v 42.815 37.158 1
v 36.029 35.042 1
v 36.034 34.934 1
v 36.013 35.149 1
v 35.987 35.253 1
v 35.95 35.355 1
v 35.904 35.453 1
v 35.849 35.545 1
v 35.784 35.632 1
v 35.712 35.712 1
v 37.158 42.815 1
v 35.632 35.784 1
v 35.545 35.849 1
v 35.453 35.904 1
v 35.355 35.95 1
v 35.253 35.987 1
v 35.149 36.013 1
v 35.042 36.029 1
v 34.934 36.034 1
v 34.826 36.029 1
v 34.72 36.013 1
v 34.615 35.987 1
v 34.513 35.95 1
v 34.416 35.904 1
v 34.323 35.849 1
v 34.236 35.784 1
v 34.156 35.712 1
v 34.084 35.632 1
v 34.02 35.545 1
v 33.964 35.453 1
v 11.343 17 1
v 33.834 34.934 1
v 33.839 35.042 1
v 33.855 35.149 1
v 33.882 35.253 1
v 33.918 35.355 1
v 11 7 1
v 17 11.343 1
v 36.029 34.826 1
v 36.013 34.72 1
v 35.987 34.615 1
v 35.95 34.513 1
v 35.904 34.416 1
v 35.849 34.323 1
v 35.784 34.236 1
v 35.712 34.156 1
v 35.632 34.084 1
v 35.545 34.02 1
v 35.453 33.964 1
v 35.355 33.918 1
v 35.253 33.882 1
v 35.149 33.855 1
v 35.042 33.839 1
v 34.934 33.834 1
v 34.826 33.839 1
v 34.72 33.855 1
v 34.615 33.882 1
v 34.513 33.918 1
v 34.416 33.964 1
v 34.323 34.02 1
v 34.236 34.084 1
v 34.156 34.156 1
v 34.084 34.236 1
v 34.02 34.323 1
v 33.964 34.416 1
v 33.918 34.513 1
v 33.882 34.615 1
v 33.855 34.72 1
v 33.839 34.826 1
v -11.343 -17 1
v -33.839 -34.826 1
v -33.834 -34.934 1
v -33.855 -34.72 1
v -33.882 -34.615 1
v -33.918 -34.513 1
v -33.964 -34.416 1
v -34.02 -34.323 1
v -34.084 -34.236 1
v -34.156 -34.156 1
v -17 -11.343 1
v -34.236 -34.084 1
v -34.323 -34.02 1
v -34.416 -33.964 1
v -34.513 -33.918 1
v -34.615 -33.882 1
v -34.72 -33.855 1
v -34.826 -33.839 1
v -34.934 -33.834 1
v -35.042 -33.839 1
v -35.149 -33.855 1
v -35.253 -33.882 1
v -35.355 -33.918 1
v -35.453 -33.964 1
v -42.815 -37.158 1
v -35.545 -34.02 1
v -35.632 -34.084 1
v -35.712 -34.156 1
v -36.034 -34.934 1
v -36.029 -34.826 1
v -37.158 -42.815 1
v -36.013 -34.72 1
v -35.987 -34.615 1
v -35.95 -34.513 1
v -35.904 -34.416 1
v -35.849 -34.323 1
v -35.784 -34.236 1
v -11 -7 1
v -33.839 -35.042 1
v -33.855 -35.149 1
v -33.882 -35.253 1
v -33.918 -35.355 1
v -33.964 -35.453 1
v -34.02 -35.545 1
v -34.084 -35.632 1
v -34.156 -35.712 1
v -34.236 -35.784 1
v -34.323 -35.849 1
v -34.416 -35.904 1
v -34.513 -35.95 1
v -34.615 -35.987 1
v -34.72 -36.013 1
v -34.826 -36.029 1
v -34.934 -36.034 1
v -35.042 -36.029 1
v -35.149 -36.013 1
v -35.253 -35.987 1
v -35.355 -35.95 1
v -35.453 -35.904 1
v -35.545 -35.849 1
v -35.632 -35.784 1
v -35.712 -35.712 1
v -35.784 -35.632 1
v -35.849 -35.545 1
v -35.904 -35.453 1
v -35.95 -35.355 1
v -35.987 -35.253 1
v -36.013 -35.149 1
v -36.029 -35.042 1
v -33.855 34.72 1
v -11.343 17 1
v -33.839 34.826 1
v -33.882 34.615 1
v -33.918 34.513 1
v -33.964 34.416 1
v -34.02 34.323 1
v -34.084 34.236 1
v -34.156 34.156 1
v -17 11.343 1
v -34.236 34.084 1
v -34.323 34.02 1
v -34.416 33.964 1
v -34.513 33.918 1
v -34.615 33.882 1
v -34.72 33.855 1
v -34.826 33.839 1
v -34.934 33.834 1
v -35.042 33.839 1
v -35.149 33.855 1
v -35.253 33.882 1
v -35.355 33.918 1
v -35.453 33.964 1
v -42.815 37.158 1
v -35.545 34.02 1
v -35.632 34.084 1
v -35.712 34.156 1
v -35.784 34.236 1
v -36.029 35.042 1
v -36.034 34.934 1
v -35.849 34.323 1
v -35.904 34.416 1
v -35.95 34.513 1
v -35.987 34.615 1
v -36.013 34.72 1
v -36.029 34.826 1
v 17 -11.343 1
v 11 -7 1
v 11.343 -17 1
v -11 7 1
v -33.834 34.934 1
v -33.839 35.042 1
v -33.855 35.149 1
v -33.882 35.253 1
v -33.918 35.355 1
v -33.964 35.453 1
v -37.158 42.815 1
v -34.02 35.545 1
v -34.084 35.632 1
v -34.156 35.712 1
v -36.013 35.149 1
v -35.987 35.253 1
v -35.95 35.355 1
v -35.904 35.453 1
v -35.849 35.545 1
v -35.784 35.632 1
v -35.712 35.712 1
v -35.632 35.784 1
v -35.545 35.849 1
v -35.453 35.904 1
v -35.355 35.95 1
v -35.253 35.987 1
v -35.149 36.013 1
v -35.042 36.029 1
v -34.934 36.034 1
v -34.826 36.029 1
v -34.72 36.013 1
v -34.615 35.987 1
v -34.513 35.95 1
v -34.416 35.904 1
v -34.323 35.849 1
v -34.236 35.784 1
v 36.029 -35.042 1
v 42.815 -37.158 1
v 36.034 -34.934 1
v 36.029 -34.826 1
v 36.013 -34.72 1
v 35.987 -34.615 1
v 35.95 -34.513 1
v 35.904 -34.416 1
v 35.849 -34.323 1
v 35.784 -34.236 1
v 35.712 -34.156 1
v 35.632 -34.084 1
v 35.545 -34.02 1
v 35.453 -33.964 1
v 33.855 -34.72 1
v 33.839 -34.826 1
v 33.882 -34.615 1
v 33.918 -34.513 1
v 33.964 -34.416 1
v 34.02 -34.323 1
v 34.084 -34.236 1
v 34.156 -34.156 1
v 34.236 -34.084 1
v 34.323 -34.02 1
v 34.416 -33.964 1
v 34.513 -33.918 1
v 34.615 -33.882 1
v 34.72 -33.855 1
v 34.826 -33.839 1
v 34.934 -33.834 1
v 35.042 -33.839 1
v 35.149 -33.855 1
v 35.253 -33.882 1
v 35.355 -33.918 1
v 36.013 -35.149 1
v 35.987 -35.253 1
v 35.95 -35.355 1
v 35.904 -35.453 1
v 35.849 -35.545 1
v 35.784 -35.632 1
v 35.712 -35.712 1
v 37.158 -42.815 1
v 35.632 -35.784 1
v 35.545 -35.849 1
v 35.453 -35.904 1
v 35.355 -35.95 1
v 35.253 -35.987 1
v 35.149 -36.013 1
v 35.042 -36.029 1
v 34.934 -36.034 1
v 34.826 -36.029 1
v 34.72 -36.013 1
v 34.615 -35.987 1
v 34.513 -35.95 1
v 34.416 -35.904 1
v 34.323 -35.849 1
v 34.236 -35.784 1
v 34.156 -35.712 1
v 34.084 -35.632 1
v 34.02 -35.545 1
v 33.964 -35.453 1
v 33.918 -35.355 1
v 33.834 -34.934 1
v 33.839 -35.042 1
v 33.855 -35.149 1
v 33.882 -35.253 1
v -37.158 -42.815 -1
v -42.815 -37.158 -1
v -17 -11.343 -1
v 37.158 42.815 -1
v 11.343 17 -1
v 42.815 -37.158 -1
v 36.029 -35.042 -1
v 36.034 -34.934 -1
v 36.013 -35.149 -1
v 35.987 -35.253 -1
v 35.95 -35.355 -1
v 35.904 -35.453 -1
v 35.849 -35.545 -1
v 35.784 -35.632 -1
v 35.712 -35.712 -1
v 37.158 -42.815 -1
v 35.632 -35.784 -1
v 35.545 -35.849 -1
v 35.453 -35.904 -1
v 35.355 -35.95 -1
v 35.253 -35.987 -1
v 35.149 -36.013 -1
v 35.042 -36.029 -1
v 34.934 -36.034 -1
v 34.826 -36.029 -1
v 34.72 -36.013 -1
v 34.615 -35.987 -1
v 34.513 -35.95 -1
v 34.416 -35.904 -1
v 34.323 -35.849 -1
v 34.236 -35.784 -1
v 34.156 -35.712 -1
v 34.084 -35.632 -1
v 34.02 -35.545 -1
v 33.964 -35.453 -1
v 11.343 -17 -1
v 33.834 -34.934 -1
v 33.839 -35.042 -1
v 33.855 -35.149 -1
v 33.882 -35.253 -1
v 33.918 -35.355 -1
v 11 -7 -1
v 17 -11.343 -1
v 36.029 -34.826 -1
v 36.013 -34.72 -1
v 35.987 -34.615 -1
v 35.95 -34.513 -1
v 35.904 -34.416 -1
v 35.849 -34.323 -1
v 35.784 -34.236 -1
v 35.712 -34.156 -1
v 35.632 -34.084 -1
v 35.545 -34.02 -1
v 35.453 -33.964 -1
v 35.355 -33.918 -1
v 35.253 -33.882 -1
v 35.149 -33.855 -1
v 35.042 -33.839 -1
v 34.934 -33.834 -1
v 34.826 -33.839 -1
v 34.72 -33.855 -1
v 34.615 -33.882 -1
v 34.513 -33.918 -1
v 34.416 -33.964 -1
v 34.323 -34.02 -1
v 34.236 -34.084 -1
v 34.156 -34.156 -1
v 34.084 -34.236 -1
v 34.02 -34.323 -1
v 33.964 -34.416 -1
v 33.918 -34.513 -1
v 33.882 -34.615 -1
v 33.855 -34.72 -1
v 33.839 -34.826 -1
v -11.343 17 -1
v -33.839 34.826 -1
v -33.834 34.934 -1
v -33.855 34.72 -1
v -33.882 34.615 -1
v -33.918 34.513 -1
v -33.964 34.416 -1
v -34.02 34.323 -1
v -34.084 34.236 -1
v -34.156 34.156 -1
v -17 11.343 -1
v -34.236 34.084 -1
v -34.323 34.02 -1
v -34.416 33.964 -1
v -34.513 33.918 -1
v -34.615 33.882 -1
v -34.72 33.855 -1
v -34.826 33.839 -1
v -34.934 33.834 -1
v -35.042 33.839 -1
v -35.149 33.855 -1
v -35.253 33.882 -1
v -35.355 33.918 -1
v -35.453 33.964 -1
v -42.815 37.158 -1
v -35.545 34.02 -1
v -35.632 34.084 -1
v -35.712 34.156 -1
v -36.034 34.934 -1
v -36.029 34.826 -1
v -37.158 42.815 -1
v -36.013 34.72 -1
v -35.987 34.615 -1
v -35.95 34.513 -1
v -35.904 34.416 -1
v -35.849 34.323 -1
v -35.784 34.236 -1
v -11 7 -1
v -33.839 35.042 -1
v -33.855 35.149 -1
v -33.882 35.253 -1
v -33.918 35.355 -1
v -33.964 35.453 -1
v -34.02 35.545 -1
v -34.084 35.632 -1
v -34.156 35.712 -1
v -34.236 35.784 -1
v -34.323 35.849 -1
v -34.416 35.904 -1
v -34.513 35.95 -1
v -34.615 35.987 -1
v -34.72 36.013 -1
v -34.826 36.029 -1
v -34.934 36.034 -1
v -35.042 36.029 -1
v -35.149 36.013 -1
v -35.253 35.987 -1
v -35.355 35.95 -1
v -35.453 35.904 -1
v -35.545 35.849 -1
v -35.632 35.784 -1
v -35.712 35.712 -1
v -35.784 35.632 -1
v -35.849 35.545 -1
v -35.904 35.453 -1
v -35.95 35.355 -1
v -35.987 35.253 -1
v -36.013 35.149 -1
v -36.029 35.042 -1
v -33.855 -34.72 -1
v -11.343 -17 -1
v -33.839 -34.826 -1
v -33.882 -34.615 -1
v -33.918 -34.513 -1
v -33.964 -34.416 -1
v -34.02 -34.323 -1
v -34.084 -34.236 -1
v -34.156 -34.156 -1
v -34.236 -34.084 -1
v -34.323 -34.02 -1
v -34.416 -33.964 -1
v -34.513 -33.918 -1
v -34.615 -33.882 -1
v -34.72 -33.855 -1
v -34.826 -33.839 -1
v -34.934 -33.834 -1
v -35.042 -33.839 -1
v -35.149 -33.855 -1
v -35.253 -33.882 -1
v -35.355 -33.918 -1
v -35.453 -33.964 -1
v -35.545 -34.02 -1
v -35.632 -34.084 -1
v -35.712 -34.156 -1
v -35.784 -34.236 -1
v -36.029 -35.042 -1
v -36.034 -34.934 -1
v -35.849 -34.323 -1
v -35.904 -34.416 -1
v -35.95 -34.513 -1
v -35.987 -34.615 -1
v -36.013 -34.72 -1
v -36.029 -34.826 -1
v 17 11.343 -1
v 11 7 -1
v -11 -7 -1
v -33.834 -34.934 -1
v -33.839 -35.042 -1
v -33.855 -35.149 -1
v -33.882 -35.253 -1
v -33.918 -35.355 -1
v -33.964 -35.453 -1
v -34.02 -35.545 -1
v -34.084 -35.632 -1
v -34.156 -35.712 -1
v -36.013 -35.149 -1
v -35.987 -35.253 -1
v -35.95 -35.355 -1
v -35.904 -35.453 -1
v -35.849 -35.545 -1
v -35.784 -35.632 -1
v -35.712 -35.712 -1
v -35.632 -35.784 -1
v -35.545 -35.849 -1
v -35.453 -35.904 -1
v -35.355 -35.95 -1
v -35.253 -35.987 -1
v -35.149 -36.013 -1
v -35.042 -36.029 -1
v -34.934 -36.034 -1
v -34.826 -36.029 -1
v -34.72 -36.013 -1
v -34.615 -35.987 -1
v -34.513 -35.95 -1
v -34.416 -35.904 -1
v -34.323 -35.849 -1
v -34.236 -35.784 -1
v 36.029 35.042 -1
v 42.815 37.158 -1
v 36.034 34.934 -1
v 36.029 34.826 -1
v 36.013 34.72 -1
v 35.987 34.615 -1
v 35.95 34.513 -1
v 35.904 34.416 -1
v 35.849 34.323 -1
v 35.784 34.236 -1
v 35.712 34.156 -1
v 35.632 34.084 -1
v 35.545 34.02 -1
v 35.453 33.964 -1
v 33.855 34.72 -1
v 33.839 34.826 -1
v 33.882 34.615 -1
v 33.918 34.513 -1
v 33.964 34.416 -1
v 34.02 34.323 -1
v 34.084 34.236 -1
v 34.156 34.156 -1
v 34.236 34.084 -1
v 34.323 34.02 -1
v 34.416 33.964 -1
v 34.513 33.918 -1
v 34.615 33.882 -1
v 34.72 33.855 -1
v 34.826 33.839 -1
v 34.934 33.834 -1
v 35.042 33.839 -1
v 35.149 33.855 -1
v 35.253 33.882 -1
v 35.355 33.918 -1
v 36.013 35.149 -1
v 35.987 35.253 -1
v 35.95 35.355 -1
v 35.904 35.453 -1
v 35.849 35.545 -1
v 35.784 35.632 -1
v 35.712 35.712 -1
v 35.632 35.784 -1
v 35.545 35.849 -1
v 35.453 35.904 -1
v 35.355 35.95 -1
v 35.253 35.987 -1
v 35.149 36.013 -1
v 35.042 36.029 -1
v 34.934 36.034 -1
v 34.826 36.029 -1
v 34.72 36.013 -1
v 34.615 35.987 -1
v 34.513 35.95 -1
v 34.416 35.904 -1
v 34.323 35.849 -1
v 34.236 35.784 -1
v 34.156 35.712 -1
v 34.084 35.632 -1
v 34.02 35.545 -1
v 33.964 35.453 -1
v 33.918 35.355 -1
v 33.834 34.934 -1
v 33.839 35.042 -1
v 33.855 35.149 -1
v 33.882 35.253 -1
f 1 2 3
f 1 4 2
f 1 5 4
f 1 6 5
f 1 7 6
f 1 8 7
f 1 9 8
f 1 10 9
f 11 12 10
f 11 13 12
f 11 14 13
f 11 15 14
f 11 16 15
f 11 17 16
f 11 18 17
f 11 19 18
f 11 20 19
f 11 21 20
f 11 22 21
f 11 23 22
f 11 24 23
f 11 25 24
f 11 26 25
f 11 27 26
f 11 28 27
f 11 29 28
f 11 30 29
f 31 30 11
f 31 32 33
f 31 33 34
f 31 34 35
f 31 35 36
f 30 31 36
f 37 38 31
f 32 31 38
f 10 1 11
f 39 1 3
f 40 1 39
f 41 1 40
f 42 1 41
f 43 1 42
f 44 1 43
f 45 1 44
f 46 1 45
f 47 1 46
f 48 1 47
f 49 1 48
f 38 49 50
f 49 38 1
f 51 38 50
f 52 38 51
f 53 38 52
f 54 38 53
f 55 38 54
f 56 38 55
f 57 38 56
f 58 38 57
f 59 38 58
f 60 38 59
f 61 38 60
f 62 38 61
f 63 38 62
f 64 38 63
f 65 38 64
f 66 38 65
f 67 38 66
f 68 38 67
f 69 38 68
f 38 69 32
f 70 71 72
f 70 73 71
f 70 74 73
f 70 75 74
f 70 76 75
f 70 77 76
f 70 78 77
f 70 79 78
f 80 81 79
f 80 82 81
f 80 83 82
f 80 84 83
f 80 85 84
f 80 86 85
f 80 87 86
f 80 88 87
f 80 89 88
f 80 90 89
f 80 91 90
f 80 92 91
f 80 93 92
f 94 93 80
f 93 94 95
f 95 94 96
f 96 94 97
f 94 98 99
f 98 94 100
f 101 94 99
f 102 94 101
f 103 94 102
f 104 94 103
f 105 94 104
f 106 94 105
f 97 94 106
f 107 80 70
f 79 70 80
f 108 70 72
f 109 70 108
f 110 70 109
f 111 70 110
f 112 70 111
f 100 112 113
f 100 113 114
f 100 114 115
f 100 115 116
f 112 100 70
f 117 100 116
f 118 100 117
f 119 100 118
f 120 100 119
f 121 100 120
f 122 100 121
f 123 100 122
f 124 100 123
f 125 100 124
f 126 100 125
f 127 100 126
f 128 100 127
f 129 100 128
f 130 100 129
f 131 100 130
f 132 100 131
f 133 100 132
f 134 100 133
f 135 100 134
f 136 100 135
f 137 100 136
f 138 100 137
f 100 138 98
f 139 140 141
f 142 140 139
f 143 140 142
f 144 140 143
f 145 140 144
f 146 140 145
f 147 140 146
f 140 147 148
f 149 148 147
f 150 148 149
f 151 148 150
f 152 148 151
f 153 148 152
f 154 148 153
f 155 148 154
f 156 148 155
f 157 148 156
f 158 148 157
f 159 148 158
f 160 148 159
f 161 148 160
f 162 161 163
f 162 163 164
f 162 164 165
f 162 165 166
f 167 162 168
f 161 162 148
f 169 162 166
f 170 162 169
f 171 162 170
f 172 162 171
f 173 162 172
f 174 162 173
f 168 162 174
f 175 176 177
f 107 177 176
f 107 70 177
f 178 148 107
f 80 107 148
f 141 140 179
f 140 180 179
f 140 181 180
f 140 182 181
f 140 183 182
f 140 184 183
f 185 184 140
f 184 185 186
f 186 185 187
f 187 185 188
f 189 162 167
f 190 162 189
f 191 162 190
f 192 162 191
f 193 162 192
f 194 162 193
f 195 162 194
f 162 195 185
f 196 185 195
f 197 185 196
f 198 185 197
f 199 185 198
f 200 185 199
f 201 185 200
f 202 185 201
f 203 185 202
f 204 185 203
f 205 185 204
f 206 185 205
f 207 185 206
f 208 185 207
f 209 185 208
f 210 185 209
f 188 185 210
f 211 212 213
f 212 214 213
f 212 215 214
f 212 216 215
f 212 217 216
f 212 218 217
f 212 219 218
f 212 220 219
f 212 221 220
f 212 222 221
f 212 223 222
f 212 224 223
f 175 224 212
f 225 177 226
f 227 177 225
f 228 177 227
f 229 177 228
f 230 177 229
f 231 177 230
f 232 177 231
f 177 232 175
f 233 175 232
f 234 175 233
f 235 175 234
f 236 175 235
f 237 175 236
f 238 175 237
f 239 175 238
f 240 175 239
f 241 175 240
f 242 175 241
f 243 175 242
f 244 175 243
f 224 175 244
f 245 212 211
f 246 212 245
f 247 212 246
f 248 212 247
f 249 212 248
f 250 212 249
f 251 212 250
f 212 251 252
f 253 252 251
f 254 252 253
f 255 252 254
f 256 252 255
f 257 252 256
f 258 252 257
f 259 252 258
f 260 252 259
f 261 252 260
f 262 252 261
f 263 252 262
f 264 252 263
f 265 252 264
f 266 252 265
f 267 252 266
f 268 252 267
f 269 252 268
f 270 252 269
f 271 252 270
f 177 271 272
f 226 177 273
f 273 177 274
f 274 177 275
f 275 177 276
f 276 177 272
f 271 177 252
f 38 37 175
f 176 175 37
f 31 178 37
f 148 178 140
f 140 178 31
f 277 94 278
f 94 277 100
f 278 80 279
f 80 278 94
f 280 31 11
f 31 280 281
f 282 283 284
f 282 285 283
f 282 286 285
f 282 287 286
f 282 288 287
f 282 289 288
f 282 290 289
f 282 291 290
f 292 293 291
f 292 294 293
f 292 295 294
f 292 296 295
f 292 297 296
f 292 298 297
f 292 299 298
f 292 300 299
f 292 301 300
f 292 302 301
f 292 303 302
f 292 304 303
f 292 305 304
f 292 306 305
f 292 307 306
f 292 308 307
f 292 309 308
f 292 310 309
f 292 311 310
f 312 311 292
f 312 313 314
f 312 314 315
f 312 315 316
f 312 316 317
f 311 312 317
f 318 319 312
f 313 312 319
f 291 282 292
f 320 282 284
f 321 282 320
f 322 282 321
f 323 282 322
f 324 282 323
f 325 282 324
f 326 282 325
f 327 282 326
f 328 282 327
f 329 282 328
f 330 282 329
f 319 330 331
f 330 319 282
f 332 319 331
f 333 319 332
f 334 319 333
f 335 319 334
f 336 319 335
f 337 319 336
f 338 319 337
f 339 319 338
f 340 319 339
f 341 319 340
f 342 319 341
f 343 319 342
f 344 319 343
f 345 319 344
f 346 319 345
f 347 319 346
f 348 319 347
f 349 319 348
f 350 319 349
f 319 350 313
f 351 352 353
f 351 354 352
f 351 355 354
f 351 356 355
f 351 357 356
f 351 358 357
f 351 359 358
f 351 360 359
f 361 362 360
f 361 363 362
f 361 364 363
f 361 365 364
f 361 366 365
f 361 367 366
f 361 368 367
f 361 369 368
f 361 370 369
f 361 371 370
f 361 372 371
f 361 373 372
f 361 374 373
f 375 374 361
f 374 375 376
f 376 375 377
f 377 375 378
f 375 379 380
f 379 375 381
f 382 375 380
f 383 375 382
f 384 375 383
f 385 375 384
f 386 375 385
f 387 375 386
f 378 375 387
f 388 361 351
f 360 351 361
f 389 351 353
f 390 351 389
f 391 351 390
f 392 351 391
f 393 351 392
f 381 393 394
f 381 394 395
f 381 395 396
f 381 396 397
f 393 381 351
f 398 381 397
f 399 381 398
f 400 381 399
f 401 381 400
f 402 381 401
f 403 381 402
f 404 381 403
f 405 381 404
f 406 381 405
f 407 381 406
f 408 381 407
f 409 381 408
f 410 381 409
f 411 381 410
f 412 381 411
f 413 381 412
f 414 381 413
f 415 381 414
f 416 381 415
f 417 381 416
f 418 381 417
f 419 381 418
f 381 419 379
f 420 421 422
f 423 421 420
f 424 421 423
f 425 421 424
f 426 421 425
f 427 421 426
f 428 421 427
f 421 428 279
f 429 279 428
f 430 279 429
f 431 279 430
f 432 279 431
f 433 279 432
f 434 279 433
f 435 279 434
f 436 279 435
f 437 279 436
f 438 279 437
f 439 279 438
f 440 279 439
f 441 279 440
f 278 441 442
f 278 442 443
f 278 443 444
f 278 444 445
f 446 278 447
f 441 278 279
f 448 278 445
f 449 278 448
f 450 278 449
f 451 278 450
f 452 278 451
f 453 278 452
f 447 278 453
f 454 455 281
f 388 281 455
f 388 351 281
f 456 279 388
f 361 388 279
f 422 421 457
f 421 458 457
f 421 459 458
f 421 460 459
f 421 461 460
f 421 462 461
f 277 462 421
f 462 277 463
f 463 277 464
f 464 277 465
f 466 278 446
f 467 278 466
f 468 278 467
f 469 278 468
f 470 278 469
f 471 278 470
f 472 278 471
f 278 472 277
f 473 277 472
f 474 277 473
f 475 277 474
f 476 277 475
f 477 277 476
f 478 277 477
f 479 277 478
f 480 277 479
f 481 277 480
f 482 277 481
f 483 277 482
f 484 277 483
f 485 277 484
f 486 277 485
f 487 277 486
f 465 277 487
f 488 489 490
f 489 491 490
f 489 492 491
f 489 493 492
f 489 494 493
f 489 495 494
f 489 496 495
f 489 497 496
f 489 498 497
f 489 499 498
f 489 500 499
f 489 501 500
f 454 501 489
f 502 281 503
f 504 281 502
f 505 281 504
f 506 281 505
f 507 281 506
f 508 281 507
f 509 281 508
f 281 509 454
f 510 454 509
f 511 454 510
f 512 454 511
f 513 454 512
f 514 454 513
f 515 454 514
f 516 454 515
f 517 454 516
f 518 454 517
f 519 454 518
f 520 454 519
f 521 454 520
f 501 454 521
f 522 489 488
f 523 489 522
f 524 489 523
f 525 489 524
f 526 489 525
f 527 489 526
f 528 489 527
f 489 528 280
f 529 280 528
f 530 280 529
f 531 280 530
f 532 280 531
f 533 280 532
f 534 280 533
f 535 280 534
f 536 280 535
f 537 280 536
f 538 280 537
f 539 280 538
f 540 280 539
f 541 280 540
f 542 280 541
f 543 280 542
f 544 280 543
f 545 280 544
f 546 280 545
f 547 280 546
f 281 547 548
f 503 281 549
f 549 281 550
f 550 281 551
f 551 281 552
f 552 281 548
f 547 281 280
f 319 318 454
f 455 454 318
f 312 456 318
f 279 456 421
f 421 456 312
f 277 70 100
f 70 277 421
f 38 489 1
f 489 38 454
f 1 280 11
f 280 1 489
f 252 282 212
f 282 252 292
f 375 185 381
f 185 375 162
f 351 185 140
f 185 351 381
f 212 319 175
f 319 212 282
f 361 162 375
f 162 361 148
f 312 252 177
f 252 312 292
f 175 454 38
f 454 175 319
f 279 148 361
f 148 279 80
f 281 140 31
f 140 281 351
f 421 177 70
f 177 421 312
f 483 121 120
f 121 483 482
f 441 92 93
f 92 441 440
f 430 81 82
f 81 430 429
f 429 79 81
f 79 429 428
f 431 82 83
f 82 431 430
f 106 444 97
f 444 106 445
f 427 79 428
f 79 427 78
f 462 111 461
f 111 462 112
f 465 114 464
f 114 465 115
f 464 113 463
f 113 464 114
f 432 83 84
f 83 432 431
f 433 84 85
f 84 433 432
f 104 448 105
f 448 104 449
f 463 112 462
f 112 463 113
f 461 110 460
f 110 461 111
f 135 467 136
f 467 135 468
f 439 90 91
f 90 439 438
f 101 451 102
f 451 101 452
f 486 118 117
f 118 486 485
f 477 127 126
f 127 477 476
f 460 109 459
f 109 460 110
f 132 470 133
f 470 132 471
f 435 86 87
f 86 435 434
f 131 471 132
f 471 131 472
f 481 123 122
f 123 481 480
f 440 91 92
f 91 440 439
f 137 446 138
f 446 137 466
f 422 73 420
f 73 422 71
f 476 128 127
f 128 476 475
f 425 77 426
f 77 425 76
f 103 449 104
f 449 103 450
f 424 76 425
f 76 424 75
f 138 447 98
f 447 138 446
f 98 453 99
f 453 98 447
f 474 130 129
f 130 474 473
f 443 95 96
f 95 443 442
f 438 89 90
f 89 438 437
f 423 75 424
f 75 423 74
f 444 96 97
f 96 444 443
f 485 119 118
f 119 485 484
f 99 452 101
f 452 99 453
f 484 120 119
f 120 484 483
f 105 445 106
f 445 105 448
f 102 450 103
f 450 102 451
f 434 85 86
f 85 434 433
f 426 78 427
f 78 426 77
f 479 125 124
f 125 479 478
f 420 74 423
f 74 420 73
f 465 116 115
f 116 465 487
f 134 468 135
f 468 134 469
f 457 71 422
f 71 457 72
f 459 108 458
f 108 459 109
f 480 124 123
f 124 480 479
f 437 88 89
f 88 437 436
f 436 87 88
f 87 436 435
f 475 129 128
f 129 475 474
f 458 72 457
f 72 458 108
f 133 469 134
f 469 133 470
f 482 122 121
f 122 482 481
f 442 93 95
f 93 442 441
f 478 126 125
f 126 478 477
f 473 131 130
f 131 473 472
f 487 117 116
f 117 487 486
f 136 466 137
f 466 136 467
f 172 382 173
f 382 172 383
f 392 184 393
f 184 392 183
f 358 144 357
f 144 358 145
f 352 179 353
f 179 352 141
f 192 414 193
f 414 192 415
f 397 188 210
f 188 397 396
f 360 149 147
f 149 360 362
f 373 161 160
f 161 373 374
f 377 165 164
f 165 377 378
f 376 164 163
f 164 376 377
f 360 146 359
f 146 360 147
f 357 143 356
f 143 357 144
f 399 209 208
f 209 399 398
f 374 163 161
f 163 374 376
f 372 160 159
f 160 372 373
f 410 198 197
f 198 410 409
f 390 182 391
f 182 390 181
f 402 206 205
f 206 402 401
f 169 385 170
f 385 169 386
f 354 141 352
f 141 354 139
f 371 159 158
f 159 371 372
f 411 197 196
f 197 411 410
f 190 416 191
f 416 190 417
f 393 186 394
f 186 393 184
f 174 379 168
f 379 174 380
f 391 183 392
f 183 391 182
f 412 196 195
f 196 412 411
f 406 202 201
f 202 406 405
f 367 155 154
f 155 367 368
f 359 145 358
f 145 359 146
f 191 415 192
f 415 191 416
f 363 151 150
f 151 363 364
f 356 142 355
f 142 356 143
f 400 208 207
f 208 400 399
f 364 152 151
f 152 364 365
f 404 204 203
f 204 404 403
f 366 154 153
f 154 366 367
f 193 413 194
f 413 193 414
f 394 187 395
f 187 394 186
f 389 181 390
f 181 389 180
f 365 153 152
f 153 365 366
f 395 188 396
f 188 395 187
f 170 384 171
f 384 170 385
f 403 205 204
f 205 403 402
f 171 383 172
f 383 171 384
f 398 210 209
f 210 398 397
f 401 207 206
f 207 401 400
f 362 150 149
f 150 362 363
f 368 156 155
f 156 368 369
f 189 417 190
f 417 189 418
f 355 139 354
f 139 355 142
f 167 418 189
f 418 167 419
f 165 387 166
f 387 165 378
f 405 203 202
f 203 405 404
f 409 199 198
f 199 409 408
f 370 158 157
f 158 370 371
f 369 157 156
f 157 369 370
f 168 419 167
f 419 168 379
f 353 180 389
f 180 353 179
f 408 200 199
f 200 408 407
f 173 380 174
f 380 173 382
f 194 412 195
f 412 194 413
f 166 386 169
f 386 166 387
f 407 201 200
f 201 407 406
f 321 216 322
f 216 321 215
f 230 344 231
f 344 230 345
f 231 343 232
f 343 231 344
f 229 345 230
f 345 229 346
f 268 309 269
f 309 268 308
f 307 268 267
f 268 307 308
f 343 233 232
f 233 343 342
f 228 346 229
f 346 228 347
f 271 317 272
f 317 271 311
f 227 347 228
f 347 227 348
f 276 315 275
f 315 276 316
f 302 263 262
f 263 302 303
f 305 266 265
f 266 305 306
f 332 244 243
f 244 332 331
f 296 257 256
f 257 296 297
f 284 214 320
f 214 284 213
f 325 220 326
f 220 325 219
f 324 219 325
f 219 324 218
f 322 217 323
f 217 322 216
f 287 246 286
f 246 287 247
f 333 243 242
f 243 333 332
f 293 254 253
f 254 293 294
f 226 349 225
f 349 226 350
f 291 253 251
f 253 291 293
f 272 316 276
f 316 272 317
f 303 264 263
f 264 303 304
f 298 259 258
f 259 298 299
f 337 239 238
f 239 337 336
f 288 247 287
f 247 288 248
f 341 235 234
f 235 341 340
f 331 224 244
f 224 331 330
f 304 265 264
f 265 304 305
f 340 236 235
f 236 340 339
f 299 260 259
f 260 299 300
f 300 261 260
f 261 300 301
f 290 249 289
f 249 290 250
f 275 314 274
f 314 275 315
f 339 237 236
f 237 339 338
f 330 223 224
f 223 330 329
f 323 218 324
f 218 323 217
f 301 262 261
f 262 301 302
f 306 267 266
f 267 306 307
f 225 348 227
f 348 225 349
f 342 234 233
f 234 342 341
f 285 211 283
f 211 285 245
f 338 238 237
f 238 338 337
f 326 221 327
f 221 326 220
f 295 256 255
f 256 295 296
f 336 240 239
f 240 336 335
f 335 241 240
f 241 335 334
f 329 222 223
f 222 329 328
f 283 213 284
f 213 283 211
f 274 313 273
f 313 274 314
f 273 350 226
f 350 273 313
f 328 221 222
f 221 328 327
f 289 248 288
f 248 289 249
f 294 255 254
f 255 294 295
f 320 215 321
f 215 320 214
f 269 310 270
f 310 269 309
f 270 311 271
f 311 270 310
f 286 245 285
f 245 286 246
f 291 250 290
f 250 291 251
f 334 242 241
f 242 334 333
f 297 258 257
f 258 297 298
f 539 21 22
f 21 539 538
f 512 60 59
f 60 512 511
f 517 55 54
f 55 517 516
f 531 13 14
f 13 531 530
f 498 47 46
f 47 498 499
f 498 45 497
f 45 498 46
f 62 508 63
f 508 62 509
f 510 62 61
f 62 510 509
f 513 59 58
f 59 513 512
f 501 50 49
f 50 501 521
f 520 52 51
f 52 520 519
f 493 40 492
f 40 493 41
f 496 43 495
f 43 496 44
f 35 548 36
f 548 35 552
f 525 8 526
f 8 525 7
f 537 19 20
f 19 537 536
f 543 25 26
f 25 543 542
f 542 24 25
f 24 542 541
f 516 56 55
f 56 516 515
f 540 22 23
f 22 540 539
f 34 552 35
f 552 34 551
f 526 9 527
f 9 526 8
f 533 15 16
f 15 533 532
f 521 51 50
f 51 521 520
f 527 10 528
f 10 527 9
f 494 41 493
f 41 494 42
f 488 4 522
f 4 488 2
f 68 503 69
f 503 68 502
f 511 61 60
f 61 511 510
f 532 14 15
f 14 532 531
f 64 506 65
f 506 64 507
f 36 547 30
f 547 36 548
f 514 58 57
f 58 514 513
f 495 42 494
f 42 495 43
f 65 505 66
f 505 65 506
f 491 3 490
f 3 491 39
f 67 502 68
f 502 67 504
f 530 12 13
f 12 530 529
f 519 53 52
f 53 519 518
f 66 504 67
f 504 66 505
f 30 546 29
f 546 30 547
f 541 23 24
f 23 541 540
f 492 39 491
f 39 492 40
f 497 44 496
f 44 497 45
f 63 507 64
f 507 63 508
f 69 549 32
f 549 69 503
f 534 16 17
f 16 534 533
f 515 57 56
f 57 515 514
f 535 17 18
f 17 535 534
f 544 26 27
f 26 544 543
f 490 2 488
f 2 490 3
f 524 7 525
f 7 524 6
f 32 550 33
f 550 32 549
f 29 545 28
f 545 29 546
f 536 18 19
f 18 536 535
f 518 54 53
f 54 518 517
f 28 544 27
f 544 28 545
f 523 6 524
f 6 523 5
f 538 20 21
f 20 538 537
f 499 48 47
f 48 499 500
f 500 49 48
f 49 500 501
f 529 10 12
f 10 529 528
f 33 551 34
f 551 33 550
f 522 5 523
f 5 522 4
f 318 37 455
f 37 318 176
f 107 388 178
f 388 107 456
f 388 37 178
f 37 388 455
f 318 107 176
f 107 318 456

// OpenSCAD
// ============================================================
//  ORNITHOPTER — Drone estilo Dune (thopter)
//  Modelo CAD paramétrico (OpenSCAD) — chassi + carenagem
//  Abre em OpenSCAD (gratuito) e exporta STL para impressão 3D
// ============================================================

/* [Dimensões principais — mm] */
motor_spacing = 78;      // distância motor-a-motor (diagonal X)
arm_width     = 8;       // largura do braço
plate_t       = 2.0;     // espessura das placas (PLA)
motor_d       = 8.5;     // diâmetro do motor 8520
motor_h       = 20;      // altura do motor 8520
prop_d        = 65;      // hélice 65 mm
ring_w        = 3.2;     // espessura do anel de proteção (gondola)
canopy_h      = 14;      // altura da carenagem estilo thopter
hole_m2       = 2.2;     // furo M2 para motores

$fn = 64;

// ---------- Módulos ----------

// Braço do frame X (entre dois motores opostos)
module arm(len) {
    rotate([0,0,45])
        cube([len, arm_width, plate_t], center=true);
}

// Suporte do motor: anel + furos M2
module motor_mount() {
    difference() {
        cylinder(d = motor_d + 5, h = plate_t, center = true);
        cylinder(d = motor_d - 1.2, h = plate_t + 1, center = true); // cavity motor
        for (a = [0, 90, 180, 270])
            rotate([0, 0, a + 45])
                translate([(motor_d + 3) / 2, 0, 0])
                    cylinder(d = hole_m2, h = plate_t + 2, center = true);
    }
}

// Anel de proteção da hélice (gondola estilo Dune)
module prop_ring() {
    rotate_extrude()
        translate([prop_d/2 + 4, 0, 0])
            circle(d = ring_w);
}

// Corpo central: duas placas + espaçadores
module body() {
    half = motor_spacing / 2;
    // braços em X
    arm(motor_spacing * 1.45);
    mirror([0,1,0]) arm(motor_spacing * 1.45);
    // placa inferior
    translate([0, 0, -plate_t/2 - 6])
        cube([34, 34, plate_t], center = true);
    // placa superior
    translate([0, 0, plate_t/2 + 6])
        cube([34, 34, plate_t], center = true);
}

// Carenagem estilo "thopter": casco alongado com quilha
module canopy() {
    hull() {
        translate([0, 0, 8]) scale([1.6, 1, 0.55]) sphere(d = 22);
        translate([-26, 0, 4]) scale([1.2, 0.8, 0.4]) sphere(d = 16); // nariz
        translate([20, 0, 4]) scale([1.3, 0.85, 0.45]) sphere(d = 18); // cauda
    }
    // quilha ventral (estabilidade visual e antitombo)
    translate([0, 0, -1]) rotate([90, 0, 0])
        linear_extrude(height = 2, center = true)
            polygon([[-24,0],[24,0],[10,-9],[-14,-9]]);
}

// ---------- Montagem ----------

half = motor_spacing / 2;

module ornithopter() {
    body();
    // motores + anéis nos 4 cantos
    for (sx = [-1, 1], sy = [-1, 1])
        translate([sx * half, sy * half, 0]) {
            prop_ring();
            translate([0, 0, motor_h/2 + plate_t/2])
                %cylinder(d = motor_d, h = motor_h, center = true); // motor (fantasma)
        }
    canopy();
}

// Plana: Vista de topo da placa única do frame (para imprimir)
module frame_flat() {
    difference() {
        union() {
            arm(motor_spacing * 1.45);
            mirror([0,1,0]) arm(motor_spacing * 1.45);
            cube([34, 34, plate_t], center = true);
        }
        // alívio de peso central
        translate([0, 0, 0]) cube([22, 14, plate_t + 2], center = true);
        // furos dos motores
        for (sx = [-1, 1], sy = [-1, 1])
            translate([sx * half, sy * half, 0])
                for (a = [0, 90, 180, 270])
                    rotate([0, 0, a + 45])
                        translate([(motor_d + 3) / 2, 0, 0])
                            cylinder(d = hole_m2, h = plate_t + 2, center = true);
    }
}

// Escolher o que mostrar:
// ornithopter();   // vista completa com carenagem e anéis
frame_flat();       // vista da placa plana pronta a imprimir
